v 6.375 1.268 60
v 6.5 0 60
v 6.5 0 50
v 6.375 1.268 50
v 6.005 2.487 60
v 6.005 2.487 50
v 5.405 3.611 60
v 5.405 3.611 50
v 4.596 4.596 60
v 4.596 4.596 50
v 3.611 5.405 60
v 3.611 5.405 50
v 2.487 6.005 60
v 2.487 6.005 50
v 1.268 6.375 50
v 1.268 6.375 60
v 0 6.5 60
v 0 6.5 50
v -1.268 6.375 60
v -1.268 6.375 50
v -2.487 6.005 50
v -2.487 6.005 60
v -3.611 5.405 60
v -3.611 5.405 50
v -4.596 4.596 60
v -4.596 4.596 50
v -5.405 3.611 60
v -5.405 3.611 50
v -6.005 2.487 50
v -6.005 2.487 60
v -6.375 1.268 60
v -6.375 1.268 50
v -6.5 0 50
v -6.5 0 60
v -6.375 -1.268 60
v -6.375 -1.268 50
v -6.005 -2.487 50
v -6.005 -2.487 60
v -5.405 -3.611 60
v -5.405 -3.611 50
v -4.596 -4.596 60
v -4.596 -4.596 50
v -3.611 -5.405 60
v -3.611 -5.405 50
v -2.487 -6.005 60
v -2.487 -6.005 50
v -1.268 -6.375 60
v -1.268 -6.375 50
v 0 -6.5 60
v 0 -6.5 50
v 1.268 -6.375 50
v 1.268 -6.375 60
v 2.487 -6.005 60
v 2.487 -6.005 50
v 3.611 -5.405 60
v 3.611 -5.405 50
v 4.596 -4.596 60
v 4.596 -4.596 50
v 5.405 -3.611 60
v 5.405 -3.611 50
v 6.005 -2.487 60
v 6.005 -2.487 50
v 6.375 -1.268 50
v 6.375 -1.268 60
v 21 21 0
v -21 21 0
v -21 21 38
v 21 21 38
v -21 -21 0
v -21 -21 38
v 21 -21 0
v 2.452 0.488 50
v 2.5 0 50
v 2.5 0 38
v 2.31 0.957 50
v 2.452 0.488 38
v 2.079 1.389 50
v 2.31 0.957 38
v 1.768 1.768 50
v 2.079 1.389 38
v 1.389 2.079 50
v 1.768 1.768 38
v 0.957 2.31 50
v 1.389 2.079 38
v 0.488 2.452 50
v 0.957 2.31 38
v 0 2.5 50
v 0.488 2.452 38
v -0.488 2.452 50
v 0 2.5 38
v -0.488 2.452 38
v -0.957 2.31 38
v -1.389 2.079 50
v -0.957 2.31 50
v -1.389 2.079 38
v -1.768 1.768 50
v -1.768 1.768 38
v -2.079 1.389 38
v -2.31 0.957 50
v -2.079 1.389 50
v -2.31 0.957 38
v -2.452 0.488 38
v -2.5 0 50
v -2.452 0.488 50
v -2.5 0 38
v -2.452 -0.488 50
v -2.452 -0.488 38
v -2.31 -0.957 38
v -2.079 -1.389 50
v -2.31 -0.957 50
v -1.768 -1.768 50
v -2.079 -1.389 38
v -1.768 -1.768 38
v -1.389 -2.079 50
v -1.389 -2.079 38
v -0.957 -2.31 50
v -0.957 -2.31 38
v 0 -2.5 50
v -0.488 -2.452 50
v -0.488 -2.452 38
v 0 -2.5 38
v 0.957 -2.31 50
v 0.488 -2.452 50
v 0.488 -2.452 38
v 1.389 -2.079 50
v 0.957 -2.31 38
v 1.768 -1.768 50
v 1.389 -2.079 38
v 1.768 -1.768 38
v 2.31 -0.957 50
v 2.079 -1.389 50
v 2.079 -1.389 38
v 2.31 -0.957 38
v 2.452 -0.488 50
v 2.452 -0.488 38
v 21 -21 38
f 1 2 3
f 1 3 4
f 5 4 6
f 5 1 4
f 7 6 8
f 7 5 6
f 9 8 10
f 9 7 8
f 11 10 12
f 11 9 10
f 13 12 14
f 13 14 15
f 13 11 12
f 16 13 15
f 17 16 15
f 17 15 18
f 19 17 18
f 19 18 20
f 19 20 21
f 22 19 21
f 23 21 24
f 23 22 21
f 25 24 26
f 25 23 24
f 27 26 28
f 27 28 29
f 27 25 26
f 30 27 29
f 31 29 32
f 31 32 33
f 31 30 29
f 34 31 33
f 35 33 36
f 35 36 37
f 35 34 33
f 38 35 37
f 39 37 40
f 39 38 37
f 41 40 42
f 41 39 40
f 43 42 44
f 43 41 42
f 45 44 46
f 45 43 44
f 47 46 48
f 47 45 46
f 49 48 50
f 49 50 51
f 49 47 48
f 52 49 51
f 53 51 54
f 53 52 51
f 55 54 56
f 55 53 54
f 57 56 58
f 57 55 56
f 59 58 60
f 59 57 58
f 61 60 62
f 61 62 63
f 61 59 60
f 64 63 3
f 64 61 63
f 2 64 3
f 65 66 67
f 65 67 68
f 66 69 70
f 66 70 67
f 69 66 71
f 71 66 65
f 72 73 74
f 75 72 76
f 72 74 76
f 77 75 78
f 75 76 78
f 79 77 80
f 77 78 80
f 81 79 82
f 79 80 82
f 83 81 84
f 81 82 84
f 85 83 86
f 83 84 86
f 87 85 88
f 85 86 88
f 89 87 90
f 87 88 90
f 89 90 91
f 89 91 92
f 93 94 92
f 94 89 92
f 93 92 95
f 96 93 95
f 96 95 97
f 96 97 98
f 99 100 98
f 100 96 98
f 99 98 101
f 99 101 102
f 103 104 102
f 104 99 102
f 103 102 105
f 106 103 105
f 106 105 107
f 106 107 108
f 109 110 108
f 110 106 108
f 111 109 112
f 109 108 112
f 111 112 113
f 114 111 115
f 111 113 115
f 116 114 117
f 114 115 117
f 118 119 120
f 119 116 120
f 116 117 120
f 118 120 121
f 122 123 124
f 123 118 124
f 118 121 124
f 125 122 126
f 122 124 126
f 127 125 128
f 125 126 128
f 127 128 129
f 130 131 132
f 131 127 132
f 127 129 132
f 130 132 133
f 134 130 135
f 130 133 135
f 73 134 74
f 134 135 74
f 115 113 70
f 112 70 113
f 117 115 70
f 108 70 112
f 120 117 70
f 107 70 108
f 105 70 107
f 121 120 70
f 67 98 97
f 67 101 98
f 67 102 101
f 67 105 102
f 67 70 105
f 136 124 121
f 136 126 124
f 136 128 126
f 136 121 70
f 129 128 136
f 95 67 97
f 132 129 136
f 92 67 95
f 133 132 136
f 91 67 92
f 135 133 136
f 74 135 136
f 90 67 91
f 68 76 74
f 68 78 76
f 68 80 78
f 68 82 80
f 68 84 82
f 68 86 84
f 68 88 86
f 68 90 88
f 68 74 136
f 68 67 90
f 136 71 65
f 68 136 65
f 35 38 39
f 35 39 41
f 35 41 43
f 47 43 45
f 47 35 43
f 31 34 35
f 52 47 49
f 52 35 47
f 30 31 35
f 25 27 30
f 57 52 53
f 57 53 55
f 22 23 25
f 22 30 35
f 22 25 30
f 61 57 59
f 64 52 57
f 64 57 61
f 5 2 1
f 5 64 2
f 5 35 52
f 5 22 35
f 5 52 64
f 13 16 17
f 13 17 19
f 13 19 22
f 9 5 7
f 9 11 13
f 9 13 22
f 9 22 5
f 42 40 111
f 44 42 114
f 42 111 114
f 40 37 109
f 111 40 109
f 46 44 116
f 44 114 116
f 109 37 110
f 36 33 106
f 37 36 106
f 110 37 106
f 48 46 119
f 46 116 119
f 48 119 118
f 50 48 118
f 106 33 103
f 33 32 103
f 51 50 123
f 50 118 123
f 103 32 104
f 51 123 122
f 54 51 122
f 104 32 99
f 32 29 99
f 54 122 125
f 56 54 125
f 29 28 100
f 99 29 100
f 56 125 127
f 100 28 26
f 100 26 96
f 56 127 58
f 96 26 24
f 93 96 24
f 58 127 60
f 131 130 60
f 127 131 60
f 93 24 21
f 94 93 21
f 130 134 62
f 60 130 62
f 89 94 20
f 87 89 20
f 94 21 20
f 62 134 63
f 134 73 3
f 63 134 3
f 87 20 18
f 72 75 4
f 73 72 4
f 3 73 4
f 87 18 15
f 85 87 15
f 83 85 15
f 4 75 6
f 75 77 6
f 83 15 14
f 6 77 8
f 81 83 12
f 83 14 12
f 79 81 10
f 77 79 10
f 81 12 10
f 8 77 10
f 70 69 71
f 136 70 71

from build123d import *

# Parameters (mm, degrees)
SKETCH1_W           = 42
SKETCH1_H           = 42
BOSS_EXTRUDE1_DEPTH = 38
SKETCH2_R           = 2.5
BOSS_EXTRUDE2_DEPTH = 22
SKETCH3_R           = 6.5
BOSS_EXTRUDE3_DEPTH = 10


with BuildPart() as part:
    # Sketch1 → Boss-Extrude1 (new body)
    with BuildSketch(Plane.XY):
        Rectangle(SKETCH1_W, SKETCH1_H)
    extrude(amount=BOSS_EXTRUDE1_DEPTH)

    # Sketch2 → Boss-Extrude2 (add)
    with BuildSketch(Plane.XY.offset(38)):
        Circle(SKETCH2_R)
    extrude(amount=BOSS_EXTRUDE2_DEPTH)

    # Sketch3 → Boss-Extrude3 (add)
    with BuildSketch(Plane.XY.offset(60)):
        Circle(SKETCH3_R)
    extrude(amount=-BOSS_EXTRUDE3_DEPTH)


solid = part.part
